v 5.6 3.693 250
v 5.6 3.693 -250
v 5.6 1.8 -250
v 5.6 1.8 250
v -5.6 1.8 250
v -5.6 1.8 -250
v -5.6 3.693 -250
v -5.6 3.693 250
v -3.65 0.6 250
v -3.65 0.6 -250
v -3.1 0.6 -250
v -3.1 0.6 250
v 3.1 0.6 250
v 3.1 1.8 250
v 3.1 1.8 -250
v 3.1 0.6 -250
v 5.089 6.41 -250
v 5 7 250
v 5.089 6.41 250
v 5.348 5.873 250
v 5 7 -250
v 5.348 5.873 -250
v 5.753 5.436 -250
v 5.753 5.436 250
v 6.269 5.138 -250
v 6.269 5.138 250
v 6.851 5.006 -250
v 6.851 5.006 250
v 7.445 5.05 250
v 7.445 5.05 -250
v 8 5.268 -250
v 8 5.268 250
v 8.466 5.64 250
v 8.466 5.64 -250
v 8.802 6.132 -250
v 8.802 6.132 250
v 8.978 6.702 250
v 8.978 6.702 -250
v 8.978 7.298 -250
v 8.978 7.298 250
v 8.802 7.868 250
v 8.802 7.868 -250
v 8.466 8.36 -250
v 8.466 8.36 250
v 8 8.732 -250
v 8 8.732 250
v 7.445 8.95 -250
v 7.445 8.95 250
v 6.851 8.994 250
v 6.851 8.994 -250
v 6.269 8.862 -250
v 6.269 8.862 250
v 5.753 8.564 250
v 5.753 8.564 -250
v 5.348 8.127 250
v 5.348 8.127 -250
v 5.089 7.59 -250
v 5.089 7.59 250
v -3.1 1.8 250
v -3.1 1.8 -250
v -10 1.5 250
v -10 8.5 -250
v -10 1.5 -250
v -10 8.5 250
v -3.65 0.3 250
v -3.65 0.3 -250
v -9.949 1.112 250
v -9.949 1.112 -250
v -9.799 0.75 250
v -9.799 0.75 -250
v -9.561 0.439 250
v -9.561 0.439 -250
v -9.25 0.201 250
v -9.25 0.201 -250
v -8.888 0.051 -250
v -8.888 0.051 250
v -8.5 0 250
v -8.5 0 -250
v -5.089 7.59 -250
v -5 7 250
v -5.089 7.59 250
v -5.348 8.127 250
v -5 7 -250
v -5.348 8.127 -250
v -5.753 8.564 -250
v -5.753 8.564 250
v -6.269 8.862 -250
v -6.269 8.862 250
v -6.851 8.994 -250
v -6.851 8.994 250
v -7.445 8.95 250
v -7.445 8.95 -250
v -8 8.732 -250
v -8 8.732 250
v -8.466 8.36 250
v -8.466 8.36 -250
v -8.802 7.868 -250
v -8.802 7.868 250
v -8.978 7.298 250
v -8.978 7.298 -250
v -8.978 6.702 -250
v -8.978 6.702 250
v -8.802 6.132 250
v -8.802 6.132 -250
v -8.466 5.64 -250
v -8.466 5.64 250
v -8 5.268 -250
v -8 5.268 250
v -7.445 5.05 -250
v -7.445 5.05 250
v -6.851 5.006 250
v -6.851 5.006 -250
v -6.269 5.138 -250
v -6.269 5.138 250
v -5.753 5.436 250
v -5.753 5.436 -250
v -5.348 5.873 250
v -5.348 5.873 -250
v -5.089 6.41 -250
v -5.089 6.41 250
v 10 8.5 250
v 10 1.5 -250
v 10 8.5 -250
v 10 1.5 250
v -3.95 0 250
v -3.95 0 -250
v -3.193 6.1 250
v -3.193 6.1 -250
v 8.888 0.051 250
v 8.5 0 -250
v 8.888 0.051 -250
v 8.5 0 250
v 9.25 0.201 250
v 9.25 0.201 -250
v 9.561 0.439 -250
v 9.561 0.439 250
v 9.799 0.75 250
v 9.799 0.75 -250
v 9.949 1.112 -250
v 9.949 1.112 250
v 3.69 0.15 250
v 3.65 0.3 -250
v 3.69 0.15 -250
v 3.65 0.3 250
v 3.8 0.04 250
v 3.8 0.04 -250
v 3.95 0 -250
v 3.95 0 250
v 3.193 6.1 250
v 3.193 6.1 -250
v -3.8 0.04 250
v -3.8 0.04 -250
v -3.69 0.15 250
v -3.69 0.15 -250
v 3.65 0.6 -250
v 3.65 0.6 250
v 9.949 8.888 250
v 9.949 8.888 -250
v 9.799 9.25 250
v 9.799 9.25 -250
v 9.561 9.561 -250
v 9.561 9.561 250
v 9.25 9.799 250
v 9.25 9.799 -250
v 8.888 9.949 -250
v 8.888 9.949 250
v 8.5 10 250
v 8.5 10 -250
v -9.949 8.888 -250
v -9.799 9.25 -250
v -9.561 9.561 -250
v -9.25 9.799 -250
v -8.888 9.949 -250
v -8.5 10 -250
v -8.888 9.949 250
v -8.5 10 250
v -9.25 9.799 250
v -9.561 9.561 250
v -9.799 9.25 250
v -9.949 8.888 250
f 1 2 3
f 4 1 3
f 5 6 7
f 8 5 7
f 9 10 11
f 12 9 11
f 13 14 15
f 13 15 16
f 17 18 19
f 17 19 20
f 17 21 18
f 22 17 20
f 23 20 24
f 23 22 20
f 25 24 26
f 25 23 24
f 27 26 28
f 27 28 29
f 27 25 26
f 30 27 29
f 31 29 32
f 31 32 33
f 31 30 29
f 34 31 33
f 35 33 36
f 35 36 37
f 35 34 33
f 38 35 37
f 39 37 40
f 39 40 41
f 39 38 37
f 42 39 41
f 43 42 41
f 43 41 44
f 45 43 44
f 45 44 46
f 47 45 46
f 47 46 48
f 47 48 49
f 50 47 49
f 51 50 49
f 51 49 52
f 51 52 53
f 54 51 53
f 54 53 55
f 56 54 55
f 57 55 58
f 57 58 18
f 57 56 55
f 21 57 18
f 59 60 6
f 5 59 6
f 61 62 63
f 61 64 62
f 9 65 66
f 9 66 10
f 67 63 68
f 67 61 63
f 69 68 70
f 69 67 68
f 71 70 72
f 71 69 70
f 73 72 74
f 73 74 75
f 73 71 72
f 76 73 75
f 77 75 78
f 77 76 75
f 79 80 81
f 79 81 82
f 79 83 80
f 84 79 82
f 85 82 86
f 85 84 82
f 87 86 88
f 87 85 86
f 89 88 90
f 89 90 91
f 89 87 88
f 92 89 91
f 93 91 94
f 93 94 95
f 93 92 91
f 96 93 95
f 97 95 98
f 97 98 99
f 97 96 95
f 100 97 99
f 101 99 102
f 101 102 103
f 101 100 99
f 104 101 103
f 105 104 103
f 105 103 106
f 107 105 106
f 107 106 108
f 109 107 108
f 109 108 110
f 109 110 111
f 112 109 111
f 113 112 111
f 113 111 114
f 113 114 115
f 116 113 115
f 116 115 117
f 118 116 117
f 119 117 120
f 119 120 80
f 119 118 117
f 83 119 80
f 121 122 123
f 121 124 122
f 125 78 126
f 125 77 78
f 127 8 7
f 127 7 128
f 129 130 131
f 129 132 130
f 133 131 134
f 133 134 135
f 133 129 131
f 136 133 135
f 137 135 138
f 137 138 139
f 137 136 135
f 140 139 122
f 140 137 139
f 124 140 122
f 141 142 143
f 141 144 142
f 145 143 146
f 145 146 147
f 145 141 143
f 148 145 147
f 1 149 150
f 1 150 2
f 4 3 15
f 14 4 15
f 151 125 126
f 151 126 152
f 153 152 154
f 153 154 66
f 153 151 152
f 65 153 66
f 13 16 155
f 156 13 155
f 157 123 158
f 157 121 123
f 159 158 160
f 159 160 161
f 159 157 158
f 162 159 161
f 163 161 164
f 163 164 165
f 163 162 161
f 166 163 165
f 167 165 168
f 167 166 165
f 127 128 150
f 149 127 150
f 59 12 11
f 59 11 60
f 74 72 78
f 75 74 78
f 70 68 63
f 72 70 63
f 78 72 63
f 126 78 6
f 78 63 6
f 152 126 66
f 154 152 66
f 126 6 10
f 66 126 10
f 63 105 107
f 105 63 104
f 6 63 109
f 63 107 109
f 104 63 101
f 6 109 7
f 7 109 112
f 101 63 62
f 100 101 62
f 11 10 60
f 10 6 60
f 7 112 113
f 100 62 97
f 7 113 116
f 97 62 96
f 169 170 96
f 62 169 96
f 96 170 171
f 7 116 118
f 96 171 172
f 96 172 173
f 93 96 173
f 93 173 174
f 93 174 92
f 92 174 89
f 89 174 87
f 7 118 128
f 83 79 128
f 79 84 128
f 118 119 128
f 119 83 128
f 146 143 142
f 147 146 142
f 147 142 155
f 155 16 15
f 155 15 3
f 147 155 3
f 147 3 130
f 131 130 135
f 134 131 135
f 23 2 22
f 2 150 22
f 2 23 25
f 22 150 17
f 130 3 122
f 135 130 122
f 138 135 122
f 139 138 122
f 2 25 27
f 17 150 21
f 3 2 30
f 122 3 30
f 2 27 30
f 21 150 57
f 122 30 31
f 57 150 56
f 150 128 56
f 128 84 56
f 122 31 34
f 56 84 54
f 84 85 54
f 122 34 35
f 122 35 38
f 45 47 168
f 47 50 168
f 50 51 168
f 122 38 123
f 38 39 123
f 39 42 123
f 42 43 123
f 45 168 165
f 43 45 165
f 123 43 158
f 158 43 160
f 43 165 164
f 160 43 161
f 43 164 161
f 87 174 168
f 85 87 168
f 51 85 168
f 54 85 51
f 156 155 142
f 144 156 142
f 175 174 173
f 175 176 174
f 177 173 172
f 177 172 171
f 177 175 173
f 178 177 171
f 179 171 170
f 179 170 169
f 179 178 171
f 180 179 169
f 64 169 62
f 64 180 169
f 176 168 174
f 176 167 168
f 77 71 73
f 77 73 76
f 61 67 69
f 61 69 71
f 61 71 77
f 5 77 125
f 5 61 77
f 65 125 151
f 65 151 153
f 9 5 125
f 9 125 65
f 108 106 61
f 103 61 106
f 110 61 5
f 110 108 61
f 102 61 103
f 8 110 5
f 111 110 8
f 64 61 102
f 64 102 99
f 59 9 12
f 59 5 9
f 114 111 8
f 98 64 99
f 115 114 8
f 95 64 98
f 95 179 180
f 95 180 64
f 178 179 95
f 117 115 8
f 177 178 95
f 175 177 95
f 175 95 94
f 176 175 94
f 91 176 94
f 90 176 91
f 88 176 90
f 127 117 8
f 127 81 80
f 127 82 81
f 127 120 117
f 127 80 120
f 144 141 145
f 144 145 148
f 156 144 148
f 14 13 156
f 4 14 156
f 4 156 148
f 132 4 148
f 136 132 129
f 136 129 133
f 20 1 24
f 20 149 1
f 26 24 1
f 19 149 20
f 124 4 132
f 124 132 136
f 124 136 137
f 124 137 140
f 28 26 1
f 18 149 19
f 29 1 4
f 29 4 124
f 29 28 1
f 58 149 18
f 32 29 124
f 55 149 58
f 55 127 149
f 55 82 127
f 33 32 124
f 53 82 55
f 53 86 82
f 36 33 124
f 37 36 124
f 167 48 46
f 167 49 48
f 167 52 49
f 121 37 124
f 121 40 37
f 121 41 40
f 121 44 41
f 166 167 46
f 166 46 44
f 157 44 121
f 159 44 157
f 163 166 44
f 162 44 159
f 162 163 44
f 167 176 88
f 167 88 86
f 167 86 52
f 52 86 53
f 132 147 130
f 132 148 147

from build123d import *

# Parameters (mm, degrees)
SKETCH_1_R      = 2
EXTRUDE_1_DEPTH = 250


with BuildPart() as part:
    # 草图1 → 凸台-拉伸1 (new, symmetric)
    with BuildSketch(Plane.XY):
        with BuildLine():
            Line((-8.5, 0), (-3.95, 0))
            ThreePointArc((-3.95, 0), (-3.737867966, 0.087867966), (-3.65, 0.3))
            Line((-3.65, 0.3), (-3.65, 0.6))
            Line((-3.65, 0.6), (-3.1, 0.6))
            Line((-3.1, 0.6), (-3.1, 1.8))
            Line((-3.1, 1.8), (-5.6, 1.8))
            Line((-5.6, 1.8), (-5.6, 3.692893219))
            Line((-5.6, 3.692893219), (-3.192893219, 6.1))
            Line((-3.192893219, 6.1), (3.192893219, 6.1))
            Line((3.192893219, 6.1), (5.6, 3.692893219))
            Line((5.6, 3.692893219), (5.6, 1.8))
            Line((5.6, 1.8), (3.1, 1.8))
            Line((3.1, 1.8), (3.1, 0.6))
            Line((3.1, 0.6), (3.65, 0.6))
            Line((3.65, 0.6), (3.65, 0.3))
            ThreePointArc((3.65, 0.3), (3.737867966, 0.087867966), (3.95, 0))
            Line((3.95, 0), (8.5, 0))
            ThreePointArc((8.5, 0), (9.560660172, 0.439339828), (10, 1.5))
            Line((10, 1.5), (10, 8.5))
            ThreePointArc((10, 8.5), (9.560660172, 9.560660172), (8.5, 10))
            Line((8.5, 10), (-8.5, 10))
            ThreePointArc((-8.5, 10), (-9.560660172, 9.560660172), (-10, 8.5))
            Line((-10, 8.5), (-10, 1.5))
            ThreePointArc((-10, 1.5), (-9.560660172, 0.439339828), (-8.5, 0))
        make_face()
        with Locations((-7, 7)):
            Circle(SKETCH_1_R, mode=Mode.SUBTRACT)
        with Locations(Location((7, 7, 0), (0, 0, 180))):
            Circle(SKETCH_1_R, mode=Mode.SUBTRACT)
    extrude(amount=EXTRUDE_1_DEPTH, both=True)


solid = part.part
